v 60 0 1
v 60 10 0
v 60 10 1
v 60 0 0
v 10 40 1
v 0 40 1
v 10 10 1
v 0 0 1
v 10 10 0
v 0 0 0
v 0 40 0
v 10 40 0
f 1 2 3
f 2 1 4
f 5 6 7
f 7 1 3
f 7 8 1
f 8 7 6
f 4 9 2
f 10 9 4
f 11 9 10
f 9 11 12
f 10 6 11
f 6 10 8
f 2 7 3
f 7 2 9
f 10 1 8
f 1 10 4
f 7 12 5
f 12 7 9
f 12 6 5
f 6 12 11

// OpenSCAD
$fn = 48;
wall = 1.0;
thickness = wall;

difference() {
    union() {
        cube([60, 10, thickness]);
        translate([0, 0, 0])
            cube([10, 40, thickness]);
    }
    translate([15, 15, -1]) cylinder(h = thickness + 2, r = 4.0);
    translate([45, 25, -1]) cylinder(h = thickness + 2, r = 4.0);
}
